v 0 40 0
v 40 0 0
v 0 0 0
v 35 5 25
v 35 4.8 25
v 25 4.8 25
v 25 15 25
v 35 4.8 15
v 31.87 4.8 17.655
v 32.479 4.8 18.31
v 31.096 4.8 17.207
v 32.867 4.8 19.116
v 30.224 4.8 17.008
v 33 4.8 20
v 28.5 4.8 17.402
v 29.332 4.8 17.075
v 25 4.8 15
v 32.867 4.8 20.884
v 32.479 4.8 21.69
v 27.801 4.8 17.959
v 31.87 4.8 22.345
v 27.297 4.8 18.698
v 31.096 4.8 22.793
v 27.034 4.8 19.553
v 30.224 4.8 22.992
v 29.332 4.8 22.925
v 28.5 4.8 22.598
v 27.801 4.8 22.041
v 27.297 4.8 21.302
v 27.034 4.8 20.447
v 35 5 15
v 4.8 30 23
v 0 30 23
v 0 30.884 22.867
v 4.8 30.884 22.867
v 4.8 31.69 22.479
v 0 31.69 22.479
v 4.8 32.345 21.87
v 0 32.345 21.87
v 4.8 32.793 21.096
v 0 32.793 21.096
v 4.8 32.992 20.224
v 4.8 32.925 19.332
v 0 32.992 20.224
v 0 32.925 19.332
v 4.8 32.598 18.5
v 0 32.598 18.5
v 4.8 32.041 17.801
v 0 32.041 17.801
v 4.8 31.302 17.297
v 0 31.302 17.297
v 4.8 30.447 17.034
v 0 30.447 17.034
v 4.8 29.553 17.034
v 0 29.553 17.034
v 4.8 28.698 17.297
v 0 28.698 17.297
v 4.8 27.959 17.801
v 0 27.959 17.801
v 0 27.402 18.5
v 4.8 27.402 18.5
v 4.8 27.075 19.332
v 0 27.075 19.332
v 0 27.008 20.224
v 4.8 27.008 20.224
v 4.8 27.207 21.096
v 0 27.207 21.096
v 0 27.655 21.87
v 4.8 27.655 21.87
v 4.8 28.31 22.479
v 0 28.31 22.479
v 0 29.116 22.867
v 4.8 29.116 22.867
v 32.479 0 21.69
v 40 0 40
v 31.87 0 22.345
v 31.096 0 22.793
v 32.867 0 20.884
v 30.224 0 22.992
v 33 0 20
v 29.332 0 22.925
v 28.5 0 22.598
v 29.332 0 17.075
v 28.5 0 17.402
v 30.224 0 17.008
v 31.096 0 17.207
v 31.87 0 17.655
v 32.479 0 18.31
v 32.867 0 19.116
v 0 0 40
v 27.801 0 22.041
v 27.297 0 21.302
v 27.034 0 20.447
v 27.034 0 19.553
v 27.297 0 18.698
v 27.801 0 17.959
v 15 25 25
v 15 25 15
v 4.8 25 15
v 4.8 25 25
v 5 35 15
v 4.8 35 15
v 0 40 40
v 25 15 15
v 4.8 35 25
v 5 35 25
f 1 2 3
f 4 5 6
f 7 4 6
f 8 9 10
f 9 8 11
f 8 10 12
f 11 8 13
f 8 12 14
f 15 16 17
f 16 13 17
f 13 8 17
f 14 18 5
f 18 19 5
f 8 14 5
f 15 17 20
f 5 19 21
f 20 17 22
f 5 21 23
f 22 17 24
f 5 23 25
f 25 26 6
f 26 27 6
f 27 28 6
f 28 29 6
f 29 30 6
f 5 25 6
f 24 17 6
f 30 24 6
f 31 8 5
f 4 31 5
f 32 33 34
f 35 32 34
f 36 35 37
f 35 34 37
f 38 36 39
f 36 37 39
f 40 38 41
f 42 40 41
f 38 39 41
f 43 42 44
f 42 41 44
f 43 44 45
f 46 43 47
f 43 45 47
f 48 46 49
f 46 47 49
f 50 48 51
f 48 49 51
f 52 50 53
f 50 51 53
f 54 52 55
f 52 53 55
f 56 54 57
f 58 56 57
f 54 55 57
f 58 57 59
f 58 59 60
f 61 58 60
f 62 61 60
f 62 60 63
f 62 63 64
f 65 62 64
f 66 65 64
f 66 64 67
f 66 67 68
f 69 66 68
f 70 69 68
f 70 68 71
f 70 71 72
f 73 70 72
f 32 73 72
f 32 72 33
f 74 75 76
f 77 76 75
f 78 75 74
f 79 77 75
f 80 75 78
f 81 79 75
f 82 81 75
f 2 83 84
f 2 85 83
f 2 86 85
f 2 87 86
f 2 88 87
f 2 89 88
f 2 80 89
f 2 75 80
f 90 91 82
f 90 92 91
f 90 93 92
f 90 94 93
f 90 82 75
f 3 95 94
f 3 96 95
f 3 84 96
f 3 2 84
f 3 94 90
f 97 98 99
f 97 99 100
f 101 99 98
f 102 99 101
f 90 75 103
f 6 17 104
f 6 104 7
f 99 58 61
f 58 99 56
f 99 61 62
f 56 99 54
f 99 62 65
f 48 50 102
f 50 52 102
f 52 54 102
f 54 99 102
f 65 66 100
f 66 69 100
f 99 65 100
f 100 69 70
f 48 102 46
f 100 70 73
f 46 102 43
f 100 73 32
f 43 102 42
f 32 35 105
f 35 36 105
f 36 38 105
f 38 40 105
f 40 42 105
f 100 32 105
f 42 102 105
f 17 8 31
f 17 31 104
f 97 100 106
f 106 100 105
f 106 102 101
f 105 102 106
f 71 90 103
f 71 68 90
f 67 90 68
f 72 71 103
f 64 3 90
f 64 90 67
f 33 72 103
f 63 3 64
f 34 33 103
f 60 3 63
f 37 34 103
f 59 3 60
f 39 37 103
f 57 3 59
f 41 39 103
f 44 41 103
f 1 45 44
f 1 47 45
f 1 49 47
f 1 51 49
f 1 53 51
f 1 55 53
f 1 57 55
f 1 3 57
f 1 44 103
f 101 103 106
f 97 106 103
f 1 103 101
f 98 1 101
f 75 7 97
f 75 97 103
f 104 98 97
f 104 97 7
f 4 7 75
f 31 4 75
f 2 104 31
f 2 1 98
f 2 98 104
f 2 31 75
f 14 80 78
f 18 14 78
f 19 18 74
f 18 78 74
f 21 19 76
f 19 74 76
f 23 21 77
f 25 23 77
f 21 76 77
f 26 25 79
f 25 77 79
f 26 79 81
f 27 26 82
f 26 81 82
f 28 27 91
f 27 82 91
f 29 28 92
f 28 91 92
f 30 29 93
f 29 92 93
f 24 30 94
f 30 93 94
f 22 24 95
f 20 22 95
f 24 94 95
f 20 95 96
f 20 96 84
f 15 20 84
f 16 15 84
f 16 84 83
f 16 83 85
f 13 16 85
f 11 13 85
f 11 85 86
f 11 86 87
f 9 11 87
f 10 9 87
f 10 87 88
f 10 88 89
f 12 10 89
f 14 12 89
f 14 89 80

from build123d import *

# Parameters (mm, degrees)
BOSS_EXTRU_1_DEPTH      = 40
ENL_V_MAT_EXTRU_1_REACH = 42
ESQUISSE3_R             = 3
ENL_V_MAT_EXTRU_2_REACH = 42
ESQUISSE4_R             = 3
ENL_V_MAT_EXTRU_4_REACH = 37.2
ESQUISSE9_W             = 10
ESQUISSE9_H             = 10
ENL_V_MAT_EXTRU_5_REACH = 37.2
ESQUISSE10_W            = 10
ESQUISSE10_H            = 10


with BuildPart() as part:
    # Esquisse2 → Boss.-Extru.1 (new body)
    with BuildSketch(Plane.XY):
        Polygon((0, 0), (0, 40), (40, 0), align=None)
    extrude(amount=BOSS_EXTRU_1_DEPTH)

    # Esquisse3 → Enlèv. mat.-Extru.1 (cut, up to next)
    with BuildSketch(Plane.XZ, mode=Mode.PRIVATE) as enl_v_mat_extru_1_sk1:
        with Locations((30, 20)):
            Circle(ESQUISSE3_R)
    enl_v_mat_extru_1_tool1 = extrude(enl_v_mat_extru_1_sk1.sketch, amount=-ENL_V_MAT_EXTRU_1_REACH, mode=Mode.PRIVATE) & part.part
    add(enl_v_mat_extru_1_tool1.solids().sort_by_distance((30, 0, 20))[0], mode=Mode.SUBTRACT)

    # Esquisse4 → Enlèv. mat.-Extru.2 (cut, up to next)
    with BuildSketch(Plane.ZY, mode=Mode.PRIVATE) as enl_v_mat_extru_2_sk1:
        with Locations((20, 30)):
            Circle(ESQUISSE4_R)
    enl_v_mat_extru_2_tool1 = extrude(enl_v_mat_extru_2_sk1.sketch, amount=-ENL_V_MAT_EXTRU_2_REACH, mode=Mode.PRIVATE) & part.part
    add(enl_v_mat_extru_2_tool1.solids().sort_by_distance((0, 30, 20))[0], mode=Mode.SUBTRACT)

    # Esquisse9 → Enlèv. mat.-Extru.4 (cut, up to next)
    with BuildSketch(Plane.ZY.offset(-4.8), mode=Mode.PRIVATE) as enl_v_mat_extru_4_sk1:
        with Locations((20, 30)):
            Rectangle(ESQUISSE9_W, ESQUISSE9_H)
    enl_v_mat_extru_4_tool1 = extrude(enl_v_mat_extru_4_sk1.sketch, amount=-ENL_V_MAT_EXTRU_4_REACH, mode=Mode.PRIVATE) & part.part
    add(enl_v_mat_extru_4_tool1.solids().sort_by_distance((4.8, 30, 20))[0], mode=Mode.SUBTRACT)

    # Esquisse10 → Enlèv. mat.-Extru.5 (cut, up to next)
    with BuildSketch(Plane(origin=(0, 4.8, 0), x_dir=(0, 0, 1), z_dir=(0, -1, 0)), mode=Mode.PRIVATE) as enl_v_mat_extru_5_sk1:
        with Locations((20, -30)):
            Rectangle(ESQUISSE10_W, ESQUISSE10_H)
    enl_v_mat_extru_5_tool1 = extrude(enl_v_mat_extru_5_sk1.sketch, amount=-ENL_V_MAT_EXTRU_5_REACH, mode=Mode.PRIVATE) & part.part
    add(enl_v_mat_extru_5_tool1.solids().sort_by_distance((30, 4.8, 20))[0], mode=Mode.SUBTRACT)


solid = part.part
